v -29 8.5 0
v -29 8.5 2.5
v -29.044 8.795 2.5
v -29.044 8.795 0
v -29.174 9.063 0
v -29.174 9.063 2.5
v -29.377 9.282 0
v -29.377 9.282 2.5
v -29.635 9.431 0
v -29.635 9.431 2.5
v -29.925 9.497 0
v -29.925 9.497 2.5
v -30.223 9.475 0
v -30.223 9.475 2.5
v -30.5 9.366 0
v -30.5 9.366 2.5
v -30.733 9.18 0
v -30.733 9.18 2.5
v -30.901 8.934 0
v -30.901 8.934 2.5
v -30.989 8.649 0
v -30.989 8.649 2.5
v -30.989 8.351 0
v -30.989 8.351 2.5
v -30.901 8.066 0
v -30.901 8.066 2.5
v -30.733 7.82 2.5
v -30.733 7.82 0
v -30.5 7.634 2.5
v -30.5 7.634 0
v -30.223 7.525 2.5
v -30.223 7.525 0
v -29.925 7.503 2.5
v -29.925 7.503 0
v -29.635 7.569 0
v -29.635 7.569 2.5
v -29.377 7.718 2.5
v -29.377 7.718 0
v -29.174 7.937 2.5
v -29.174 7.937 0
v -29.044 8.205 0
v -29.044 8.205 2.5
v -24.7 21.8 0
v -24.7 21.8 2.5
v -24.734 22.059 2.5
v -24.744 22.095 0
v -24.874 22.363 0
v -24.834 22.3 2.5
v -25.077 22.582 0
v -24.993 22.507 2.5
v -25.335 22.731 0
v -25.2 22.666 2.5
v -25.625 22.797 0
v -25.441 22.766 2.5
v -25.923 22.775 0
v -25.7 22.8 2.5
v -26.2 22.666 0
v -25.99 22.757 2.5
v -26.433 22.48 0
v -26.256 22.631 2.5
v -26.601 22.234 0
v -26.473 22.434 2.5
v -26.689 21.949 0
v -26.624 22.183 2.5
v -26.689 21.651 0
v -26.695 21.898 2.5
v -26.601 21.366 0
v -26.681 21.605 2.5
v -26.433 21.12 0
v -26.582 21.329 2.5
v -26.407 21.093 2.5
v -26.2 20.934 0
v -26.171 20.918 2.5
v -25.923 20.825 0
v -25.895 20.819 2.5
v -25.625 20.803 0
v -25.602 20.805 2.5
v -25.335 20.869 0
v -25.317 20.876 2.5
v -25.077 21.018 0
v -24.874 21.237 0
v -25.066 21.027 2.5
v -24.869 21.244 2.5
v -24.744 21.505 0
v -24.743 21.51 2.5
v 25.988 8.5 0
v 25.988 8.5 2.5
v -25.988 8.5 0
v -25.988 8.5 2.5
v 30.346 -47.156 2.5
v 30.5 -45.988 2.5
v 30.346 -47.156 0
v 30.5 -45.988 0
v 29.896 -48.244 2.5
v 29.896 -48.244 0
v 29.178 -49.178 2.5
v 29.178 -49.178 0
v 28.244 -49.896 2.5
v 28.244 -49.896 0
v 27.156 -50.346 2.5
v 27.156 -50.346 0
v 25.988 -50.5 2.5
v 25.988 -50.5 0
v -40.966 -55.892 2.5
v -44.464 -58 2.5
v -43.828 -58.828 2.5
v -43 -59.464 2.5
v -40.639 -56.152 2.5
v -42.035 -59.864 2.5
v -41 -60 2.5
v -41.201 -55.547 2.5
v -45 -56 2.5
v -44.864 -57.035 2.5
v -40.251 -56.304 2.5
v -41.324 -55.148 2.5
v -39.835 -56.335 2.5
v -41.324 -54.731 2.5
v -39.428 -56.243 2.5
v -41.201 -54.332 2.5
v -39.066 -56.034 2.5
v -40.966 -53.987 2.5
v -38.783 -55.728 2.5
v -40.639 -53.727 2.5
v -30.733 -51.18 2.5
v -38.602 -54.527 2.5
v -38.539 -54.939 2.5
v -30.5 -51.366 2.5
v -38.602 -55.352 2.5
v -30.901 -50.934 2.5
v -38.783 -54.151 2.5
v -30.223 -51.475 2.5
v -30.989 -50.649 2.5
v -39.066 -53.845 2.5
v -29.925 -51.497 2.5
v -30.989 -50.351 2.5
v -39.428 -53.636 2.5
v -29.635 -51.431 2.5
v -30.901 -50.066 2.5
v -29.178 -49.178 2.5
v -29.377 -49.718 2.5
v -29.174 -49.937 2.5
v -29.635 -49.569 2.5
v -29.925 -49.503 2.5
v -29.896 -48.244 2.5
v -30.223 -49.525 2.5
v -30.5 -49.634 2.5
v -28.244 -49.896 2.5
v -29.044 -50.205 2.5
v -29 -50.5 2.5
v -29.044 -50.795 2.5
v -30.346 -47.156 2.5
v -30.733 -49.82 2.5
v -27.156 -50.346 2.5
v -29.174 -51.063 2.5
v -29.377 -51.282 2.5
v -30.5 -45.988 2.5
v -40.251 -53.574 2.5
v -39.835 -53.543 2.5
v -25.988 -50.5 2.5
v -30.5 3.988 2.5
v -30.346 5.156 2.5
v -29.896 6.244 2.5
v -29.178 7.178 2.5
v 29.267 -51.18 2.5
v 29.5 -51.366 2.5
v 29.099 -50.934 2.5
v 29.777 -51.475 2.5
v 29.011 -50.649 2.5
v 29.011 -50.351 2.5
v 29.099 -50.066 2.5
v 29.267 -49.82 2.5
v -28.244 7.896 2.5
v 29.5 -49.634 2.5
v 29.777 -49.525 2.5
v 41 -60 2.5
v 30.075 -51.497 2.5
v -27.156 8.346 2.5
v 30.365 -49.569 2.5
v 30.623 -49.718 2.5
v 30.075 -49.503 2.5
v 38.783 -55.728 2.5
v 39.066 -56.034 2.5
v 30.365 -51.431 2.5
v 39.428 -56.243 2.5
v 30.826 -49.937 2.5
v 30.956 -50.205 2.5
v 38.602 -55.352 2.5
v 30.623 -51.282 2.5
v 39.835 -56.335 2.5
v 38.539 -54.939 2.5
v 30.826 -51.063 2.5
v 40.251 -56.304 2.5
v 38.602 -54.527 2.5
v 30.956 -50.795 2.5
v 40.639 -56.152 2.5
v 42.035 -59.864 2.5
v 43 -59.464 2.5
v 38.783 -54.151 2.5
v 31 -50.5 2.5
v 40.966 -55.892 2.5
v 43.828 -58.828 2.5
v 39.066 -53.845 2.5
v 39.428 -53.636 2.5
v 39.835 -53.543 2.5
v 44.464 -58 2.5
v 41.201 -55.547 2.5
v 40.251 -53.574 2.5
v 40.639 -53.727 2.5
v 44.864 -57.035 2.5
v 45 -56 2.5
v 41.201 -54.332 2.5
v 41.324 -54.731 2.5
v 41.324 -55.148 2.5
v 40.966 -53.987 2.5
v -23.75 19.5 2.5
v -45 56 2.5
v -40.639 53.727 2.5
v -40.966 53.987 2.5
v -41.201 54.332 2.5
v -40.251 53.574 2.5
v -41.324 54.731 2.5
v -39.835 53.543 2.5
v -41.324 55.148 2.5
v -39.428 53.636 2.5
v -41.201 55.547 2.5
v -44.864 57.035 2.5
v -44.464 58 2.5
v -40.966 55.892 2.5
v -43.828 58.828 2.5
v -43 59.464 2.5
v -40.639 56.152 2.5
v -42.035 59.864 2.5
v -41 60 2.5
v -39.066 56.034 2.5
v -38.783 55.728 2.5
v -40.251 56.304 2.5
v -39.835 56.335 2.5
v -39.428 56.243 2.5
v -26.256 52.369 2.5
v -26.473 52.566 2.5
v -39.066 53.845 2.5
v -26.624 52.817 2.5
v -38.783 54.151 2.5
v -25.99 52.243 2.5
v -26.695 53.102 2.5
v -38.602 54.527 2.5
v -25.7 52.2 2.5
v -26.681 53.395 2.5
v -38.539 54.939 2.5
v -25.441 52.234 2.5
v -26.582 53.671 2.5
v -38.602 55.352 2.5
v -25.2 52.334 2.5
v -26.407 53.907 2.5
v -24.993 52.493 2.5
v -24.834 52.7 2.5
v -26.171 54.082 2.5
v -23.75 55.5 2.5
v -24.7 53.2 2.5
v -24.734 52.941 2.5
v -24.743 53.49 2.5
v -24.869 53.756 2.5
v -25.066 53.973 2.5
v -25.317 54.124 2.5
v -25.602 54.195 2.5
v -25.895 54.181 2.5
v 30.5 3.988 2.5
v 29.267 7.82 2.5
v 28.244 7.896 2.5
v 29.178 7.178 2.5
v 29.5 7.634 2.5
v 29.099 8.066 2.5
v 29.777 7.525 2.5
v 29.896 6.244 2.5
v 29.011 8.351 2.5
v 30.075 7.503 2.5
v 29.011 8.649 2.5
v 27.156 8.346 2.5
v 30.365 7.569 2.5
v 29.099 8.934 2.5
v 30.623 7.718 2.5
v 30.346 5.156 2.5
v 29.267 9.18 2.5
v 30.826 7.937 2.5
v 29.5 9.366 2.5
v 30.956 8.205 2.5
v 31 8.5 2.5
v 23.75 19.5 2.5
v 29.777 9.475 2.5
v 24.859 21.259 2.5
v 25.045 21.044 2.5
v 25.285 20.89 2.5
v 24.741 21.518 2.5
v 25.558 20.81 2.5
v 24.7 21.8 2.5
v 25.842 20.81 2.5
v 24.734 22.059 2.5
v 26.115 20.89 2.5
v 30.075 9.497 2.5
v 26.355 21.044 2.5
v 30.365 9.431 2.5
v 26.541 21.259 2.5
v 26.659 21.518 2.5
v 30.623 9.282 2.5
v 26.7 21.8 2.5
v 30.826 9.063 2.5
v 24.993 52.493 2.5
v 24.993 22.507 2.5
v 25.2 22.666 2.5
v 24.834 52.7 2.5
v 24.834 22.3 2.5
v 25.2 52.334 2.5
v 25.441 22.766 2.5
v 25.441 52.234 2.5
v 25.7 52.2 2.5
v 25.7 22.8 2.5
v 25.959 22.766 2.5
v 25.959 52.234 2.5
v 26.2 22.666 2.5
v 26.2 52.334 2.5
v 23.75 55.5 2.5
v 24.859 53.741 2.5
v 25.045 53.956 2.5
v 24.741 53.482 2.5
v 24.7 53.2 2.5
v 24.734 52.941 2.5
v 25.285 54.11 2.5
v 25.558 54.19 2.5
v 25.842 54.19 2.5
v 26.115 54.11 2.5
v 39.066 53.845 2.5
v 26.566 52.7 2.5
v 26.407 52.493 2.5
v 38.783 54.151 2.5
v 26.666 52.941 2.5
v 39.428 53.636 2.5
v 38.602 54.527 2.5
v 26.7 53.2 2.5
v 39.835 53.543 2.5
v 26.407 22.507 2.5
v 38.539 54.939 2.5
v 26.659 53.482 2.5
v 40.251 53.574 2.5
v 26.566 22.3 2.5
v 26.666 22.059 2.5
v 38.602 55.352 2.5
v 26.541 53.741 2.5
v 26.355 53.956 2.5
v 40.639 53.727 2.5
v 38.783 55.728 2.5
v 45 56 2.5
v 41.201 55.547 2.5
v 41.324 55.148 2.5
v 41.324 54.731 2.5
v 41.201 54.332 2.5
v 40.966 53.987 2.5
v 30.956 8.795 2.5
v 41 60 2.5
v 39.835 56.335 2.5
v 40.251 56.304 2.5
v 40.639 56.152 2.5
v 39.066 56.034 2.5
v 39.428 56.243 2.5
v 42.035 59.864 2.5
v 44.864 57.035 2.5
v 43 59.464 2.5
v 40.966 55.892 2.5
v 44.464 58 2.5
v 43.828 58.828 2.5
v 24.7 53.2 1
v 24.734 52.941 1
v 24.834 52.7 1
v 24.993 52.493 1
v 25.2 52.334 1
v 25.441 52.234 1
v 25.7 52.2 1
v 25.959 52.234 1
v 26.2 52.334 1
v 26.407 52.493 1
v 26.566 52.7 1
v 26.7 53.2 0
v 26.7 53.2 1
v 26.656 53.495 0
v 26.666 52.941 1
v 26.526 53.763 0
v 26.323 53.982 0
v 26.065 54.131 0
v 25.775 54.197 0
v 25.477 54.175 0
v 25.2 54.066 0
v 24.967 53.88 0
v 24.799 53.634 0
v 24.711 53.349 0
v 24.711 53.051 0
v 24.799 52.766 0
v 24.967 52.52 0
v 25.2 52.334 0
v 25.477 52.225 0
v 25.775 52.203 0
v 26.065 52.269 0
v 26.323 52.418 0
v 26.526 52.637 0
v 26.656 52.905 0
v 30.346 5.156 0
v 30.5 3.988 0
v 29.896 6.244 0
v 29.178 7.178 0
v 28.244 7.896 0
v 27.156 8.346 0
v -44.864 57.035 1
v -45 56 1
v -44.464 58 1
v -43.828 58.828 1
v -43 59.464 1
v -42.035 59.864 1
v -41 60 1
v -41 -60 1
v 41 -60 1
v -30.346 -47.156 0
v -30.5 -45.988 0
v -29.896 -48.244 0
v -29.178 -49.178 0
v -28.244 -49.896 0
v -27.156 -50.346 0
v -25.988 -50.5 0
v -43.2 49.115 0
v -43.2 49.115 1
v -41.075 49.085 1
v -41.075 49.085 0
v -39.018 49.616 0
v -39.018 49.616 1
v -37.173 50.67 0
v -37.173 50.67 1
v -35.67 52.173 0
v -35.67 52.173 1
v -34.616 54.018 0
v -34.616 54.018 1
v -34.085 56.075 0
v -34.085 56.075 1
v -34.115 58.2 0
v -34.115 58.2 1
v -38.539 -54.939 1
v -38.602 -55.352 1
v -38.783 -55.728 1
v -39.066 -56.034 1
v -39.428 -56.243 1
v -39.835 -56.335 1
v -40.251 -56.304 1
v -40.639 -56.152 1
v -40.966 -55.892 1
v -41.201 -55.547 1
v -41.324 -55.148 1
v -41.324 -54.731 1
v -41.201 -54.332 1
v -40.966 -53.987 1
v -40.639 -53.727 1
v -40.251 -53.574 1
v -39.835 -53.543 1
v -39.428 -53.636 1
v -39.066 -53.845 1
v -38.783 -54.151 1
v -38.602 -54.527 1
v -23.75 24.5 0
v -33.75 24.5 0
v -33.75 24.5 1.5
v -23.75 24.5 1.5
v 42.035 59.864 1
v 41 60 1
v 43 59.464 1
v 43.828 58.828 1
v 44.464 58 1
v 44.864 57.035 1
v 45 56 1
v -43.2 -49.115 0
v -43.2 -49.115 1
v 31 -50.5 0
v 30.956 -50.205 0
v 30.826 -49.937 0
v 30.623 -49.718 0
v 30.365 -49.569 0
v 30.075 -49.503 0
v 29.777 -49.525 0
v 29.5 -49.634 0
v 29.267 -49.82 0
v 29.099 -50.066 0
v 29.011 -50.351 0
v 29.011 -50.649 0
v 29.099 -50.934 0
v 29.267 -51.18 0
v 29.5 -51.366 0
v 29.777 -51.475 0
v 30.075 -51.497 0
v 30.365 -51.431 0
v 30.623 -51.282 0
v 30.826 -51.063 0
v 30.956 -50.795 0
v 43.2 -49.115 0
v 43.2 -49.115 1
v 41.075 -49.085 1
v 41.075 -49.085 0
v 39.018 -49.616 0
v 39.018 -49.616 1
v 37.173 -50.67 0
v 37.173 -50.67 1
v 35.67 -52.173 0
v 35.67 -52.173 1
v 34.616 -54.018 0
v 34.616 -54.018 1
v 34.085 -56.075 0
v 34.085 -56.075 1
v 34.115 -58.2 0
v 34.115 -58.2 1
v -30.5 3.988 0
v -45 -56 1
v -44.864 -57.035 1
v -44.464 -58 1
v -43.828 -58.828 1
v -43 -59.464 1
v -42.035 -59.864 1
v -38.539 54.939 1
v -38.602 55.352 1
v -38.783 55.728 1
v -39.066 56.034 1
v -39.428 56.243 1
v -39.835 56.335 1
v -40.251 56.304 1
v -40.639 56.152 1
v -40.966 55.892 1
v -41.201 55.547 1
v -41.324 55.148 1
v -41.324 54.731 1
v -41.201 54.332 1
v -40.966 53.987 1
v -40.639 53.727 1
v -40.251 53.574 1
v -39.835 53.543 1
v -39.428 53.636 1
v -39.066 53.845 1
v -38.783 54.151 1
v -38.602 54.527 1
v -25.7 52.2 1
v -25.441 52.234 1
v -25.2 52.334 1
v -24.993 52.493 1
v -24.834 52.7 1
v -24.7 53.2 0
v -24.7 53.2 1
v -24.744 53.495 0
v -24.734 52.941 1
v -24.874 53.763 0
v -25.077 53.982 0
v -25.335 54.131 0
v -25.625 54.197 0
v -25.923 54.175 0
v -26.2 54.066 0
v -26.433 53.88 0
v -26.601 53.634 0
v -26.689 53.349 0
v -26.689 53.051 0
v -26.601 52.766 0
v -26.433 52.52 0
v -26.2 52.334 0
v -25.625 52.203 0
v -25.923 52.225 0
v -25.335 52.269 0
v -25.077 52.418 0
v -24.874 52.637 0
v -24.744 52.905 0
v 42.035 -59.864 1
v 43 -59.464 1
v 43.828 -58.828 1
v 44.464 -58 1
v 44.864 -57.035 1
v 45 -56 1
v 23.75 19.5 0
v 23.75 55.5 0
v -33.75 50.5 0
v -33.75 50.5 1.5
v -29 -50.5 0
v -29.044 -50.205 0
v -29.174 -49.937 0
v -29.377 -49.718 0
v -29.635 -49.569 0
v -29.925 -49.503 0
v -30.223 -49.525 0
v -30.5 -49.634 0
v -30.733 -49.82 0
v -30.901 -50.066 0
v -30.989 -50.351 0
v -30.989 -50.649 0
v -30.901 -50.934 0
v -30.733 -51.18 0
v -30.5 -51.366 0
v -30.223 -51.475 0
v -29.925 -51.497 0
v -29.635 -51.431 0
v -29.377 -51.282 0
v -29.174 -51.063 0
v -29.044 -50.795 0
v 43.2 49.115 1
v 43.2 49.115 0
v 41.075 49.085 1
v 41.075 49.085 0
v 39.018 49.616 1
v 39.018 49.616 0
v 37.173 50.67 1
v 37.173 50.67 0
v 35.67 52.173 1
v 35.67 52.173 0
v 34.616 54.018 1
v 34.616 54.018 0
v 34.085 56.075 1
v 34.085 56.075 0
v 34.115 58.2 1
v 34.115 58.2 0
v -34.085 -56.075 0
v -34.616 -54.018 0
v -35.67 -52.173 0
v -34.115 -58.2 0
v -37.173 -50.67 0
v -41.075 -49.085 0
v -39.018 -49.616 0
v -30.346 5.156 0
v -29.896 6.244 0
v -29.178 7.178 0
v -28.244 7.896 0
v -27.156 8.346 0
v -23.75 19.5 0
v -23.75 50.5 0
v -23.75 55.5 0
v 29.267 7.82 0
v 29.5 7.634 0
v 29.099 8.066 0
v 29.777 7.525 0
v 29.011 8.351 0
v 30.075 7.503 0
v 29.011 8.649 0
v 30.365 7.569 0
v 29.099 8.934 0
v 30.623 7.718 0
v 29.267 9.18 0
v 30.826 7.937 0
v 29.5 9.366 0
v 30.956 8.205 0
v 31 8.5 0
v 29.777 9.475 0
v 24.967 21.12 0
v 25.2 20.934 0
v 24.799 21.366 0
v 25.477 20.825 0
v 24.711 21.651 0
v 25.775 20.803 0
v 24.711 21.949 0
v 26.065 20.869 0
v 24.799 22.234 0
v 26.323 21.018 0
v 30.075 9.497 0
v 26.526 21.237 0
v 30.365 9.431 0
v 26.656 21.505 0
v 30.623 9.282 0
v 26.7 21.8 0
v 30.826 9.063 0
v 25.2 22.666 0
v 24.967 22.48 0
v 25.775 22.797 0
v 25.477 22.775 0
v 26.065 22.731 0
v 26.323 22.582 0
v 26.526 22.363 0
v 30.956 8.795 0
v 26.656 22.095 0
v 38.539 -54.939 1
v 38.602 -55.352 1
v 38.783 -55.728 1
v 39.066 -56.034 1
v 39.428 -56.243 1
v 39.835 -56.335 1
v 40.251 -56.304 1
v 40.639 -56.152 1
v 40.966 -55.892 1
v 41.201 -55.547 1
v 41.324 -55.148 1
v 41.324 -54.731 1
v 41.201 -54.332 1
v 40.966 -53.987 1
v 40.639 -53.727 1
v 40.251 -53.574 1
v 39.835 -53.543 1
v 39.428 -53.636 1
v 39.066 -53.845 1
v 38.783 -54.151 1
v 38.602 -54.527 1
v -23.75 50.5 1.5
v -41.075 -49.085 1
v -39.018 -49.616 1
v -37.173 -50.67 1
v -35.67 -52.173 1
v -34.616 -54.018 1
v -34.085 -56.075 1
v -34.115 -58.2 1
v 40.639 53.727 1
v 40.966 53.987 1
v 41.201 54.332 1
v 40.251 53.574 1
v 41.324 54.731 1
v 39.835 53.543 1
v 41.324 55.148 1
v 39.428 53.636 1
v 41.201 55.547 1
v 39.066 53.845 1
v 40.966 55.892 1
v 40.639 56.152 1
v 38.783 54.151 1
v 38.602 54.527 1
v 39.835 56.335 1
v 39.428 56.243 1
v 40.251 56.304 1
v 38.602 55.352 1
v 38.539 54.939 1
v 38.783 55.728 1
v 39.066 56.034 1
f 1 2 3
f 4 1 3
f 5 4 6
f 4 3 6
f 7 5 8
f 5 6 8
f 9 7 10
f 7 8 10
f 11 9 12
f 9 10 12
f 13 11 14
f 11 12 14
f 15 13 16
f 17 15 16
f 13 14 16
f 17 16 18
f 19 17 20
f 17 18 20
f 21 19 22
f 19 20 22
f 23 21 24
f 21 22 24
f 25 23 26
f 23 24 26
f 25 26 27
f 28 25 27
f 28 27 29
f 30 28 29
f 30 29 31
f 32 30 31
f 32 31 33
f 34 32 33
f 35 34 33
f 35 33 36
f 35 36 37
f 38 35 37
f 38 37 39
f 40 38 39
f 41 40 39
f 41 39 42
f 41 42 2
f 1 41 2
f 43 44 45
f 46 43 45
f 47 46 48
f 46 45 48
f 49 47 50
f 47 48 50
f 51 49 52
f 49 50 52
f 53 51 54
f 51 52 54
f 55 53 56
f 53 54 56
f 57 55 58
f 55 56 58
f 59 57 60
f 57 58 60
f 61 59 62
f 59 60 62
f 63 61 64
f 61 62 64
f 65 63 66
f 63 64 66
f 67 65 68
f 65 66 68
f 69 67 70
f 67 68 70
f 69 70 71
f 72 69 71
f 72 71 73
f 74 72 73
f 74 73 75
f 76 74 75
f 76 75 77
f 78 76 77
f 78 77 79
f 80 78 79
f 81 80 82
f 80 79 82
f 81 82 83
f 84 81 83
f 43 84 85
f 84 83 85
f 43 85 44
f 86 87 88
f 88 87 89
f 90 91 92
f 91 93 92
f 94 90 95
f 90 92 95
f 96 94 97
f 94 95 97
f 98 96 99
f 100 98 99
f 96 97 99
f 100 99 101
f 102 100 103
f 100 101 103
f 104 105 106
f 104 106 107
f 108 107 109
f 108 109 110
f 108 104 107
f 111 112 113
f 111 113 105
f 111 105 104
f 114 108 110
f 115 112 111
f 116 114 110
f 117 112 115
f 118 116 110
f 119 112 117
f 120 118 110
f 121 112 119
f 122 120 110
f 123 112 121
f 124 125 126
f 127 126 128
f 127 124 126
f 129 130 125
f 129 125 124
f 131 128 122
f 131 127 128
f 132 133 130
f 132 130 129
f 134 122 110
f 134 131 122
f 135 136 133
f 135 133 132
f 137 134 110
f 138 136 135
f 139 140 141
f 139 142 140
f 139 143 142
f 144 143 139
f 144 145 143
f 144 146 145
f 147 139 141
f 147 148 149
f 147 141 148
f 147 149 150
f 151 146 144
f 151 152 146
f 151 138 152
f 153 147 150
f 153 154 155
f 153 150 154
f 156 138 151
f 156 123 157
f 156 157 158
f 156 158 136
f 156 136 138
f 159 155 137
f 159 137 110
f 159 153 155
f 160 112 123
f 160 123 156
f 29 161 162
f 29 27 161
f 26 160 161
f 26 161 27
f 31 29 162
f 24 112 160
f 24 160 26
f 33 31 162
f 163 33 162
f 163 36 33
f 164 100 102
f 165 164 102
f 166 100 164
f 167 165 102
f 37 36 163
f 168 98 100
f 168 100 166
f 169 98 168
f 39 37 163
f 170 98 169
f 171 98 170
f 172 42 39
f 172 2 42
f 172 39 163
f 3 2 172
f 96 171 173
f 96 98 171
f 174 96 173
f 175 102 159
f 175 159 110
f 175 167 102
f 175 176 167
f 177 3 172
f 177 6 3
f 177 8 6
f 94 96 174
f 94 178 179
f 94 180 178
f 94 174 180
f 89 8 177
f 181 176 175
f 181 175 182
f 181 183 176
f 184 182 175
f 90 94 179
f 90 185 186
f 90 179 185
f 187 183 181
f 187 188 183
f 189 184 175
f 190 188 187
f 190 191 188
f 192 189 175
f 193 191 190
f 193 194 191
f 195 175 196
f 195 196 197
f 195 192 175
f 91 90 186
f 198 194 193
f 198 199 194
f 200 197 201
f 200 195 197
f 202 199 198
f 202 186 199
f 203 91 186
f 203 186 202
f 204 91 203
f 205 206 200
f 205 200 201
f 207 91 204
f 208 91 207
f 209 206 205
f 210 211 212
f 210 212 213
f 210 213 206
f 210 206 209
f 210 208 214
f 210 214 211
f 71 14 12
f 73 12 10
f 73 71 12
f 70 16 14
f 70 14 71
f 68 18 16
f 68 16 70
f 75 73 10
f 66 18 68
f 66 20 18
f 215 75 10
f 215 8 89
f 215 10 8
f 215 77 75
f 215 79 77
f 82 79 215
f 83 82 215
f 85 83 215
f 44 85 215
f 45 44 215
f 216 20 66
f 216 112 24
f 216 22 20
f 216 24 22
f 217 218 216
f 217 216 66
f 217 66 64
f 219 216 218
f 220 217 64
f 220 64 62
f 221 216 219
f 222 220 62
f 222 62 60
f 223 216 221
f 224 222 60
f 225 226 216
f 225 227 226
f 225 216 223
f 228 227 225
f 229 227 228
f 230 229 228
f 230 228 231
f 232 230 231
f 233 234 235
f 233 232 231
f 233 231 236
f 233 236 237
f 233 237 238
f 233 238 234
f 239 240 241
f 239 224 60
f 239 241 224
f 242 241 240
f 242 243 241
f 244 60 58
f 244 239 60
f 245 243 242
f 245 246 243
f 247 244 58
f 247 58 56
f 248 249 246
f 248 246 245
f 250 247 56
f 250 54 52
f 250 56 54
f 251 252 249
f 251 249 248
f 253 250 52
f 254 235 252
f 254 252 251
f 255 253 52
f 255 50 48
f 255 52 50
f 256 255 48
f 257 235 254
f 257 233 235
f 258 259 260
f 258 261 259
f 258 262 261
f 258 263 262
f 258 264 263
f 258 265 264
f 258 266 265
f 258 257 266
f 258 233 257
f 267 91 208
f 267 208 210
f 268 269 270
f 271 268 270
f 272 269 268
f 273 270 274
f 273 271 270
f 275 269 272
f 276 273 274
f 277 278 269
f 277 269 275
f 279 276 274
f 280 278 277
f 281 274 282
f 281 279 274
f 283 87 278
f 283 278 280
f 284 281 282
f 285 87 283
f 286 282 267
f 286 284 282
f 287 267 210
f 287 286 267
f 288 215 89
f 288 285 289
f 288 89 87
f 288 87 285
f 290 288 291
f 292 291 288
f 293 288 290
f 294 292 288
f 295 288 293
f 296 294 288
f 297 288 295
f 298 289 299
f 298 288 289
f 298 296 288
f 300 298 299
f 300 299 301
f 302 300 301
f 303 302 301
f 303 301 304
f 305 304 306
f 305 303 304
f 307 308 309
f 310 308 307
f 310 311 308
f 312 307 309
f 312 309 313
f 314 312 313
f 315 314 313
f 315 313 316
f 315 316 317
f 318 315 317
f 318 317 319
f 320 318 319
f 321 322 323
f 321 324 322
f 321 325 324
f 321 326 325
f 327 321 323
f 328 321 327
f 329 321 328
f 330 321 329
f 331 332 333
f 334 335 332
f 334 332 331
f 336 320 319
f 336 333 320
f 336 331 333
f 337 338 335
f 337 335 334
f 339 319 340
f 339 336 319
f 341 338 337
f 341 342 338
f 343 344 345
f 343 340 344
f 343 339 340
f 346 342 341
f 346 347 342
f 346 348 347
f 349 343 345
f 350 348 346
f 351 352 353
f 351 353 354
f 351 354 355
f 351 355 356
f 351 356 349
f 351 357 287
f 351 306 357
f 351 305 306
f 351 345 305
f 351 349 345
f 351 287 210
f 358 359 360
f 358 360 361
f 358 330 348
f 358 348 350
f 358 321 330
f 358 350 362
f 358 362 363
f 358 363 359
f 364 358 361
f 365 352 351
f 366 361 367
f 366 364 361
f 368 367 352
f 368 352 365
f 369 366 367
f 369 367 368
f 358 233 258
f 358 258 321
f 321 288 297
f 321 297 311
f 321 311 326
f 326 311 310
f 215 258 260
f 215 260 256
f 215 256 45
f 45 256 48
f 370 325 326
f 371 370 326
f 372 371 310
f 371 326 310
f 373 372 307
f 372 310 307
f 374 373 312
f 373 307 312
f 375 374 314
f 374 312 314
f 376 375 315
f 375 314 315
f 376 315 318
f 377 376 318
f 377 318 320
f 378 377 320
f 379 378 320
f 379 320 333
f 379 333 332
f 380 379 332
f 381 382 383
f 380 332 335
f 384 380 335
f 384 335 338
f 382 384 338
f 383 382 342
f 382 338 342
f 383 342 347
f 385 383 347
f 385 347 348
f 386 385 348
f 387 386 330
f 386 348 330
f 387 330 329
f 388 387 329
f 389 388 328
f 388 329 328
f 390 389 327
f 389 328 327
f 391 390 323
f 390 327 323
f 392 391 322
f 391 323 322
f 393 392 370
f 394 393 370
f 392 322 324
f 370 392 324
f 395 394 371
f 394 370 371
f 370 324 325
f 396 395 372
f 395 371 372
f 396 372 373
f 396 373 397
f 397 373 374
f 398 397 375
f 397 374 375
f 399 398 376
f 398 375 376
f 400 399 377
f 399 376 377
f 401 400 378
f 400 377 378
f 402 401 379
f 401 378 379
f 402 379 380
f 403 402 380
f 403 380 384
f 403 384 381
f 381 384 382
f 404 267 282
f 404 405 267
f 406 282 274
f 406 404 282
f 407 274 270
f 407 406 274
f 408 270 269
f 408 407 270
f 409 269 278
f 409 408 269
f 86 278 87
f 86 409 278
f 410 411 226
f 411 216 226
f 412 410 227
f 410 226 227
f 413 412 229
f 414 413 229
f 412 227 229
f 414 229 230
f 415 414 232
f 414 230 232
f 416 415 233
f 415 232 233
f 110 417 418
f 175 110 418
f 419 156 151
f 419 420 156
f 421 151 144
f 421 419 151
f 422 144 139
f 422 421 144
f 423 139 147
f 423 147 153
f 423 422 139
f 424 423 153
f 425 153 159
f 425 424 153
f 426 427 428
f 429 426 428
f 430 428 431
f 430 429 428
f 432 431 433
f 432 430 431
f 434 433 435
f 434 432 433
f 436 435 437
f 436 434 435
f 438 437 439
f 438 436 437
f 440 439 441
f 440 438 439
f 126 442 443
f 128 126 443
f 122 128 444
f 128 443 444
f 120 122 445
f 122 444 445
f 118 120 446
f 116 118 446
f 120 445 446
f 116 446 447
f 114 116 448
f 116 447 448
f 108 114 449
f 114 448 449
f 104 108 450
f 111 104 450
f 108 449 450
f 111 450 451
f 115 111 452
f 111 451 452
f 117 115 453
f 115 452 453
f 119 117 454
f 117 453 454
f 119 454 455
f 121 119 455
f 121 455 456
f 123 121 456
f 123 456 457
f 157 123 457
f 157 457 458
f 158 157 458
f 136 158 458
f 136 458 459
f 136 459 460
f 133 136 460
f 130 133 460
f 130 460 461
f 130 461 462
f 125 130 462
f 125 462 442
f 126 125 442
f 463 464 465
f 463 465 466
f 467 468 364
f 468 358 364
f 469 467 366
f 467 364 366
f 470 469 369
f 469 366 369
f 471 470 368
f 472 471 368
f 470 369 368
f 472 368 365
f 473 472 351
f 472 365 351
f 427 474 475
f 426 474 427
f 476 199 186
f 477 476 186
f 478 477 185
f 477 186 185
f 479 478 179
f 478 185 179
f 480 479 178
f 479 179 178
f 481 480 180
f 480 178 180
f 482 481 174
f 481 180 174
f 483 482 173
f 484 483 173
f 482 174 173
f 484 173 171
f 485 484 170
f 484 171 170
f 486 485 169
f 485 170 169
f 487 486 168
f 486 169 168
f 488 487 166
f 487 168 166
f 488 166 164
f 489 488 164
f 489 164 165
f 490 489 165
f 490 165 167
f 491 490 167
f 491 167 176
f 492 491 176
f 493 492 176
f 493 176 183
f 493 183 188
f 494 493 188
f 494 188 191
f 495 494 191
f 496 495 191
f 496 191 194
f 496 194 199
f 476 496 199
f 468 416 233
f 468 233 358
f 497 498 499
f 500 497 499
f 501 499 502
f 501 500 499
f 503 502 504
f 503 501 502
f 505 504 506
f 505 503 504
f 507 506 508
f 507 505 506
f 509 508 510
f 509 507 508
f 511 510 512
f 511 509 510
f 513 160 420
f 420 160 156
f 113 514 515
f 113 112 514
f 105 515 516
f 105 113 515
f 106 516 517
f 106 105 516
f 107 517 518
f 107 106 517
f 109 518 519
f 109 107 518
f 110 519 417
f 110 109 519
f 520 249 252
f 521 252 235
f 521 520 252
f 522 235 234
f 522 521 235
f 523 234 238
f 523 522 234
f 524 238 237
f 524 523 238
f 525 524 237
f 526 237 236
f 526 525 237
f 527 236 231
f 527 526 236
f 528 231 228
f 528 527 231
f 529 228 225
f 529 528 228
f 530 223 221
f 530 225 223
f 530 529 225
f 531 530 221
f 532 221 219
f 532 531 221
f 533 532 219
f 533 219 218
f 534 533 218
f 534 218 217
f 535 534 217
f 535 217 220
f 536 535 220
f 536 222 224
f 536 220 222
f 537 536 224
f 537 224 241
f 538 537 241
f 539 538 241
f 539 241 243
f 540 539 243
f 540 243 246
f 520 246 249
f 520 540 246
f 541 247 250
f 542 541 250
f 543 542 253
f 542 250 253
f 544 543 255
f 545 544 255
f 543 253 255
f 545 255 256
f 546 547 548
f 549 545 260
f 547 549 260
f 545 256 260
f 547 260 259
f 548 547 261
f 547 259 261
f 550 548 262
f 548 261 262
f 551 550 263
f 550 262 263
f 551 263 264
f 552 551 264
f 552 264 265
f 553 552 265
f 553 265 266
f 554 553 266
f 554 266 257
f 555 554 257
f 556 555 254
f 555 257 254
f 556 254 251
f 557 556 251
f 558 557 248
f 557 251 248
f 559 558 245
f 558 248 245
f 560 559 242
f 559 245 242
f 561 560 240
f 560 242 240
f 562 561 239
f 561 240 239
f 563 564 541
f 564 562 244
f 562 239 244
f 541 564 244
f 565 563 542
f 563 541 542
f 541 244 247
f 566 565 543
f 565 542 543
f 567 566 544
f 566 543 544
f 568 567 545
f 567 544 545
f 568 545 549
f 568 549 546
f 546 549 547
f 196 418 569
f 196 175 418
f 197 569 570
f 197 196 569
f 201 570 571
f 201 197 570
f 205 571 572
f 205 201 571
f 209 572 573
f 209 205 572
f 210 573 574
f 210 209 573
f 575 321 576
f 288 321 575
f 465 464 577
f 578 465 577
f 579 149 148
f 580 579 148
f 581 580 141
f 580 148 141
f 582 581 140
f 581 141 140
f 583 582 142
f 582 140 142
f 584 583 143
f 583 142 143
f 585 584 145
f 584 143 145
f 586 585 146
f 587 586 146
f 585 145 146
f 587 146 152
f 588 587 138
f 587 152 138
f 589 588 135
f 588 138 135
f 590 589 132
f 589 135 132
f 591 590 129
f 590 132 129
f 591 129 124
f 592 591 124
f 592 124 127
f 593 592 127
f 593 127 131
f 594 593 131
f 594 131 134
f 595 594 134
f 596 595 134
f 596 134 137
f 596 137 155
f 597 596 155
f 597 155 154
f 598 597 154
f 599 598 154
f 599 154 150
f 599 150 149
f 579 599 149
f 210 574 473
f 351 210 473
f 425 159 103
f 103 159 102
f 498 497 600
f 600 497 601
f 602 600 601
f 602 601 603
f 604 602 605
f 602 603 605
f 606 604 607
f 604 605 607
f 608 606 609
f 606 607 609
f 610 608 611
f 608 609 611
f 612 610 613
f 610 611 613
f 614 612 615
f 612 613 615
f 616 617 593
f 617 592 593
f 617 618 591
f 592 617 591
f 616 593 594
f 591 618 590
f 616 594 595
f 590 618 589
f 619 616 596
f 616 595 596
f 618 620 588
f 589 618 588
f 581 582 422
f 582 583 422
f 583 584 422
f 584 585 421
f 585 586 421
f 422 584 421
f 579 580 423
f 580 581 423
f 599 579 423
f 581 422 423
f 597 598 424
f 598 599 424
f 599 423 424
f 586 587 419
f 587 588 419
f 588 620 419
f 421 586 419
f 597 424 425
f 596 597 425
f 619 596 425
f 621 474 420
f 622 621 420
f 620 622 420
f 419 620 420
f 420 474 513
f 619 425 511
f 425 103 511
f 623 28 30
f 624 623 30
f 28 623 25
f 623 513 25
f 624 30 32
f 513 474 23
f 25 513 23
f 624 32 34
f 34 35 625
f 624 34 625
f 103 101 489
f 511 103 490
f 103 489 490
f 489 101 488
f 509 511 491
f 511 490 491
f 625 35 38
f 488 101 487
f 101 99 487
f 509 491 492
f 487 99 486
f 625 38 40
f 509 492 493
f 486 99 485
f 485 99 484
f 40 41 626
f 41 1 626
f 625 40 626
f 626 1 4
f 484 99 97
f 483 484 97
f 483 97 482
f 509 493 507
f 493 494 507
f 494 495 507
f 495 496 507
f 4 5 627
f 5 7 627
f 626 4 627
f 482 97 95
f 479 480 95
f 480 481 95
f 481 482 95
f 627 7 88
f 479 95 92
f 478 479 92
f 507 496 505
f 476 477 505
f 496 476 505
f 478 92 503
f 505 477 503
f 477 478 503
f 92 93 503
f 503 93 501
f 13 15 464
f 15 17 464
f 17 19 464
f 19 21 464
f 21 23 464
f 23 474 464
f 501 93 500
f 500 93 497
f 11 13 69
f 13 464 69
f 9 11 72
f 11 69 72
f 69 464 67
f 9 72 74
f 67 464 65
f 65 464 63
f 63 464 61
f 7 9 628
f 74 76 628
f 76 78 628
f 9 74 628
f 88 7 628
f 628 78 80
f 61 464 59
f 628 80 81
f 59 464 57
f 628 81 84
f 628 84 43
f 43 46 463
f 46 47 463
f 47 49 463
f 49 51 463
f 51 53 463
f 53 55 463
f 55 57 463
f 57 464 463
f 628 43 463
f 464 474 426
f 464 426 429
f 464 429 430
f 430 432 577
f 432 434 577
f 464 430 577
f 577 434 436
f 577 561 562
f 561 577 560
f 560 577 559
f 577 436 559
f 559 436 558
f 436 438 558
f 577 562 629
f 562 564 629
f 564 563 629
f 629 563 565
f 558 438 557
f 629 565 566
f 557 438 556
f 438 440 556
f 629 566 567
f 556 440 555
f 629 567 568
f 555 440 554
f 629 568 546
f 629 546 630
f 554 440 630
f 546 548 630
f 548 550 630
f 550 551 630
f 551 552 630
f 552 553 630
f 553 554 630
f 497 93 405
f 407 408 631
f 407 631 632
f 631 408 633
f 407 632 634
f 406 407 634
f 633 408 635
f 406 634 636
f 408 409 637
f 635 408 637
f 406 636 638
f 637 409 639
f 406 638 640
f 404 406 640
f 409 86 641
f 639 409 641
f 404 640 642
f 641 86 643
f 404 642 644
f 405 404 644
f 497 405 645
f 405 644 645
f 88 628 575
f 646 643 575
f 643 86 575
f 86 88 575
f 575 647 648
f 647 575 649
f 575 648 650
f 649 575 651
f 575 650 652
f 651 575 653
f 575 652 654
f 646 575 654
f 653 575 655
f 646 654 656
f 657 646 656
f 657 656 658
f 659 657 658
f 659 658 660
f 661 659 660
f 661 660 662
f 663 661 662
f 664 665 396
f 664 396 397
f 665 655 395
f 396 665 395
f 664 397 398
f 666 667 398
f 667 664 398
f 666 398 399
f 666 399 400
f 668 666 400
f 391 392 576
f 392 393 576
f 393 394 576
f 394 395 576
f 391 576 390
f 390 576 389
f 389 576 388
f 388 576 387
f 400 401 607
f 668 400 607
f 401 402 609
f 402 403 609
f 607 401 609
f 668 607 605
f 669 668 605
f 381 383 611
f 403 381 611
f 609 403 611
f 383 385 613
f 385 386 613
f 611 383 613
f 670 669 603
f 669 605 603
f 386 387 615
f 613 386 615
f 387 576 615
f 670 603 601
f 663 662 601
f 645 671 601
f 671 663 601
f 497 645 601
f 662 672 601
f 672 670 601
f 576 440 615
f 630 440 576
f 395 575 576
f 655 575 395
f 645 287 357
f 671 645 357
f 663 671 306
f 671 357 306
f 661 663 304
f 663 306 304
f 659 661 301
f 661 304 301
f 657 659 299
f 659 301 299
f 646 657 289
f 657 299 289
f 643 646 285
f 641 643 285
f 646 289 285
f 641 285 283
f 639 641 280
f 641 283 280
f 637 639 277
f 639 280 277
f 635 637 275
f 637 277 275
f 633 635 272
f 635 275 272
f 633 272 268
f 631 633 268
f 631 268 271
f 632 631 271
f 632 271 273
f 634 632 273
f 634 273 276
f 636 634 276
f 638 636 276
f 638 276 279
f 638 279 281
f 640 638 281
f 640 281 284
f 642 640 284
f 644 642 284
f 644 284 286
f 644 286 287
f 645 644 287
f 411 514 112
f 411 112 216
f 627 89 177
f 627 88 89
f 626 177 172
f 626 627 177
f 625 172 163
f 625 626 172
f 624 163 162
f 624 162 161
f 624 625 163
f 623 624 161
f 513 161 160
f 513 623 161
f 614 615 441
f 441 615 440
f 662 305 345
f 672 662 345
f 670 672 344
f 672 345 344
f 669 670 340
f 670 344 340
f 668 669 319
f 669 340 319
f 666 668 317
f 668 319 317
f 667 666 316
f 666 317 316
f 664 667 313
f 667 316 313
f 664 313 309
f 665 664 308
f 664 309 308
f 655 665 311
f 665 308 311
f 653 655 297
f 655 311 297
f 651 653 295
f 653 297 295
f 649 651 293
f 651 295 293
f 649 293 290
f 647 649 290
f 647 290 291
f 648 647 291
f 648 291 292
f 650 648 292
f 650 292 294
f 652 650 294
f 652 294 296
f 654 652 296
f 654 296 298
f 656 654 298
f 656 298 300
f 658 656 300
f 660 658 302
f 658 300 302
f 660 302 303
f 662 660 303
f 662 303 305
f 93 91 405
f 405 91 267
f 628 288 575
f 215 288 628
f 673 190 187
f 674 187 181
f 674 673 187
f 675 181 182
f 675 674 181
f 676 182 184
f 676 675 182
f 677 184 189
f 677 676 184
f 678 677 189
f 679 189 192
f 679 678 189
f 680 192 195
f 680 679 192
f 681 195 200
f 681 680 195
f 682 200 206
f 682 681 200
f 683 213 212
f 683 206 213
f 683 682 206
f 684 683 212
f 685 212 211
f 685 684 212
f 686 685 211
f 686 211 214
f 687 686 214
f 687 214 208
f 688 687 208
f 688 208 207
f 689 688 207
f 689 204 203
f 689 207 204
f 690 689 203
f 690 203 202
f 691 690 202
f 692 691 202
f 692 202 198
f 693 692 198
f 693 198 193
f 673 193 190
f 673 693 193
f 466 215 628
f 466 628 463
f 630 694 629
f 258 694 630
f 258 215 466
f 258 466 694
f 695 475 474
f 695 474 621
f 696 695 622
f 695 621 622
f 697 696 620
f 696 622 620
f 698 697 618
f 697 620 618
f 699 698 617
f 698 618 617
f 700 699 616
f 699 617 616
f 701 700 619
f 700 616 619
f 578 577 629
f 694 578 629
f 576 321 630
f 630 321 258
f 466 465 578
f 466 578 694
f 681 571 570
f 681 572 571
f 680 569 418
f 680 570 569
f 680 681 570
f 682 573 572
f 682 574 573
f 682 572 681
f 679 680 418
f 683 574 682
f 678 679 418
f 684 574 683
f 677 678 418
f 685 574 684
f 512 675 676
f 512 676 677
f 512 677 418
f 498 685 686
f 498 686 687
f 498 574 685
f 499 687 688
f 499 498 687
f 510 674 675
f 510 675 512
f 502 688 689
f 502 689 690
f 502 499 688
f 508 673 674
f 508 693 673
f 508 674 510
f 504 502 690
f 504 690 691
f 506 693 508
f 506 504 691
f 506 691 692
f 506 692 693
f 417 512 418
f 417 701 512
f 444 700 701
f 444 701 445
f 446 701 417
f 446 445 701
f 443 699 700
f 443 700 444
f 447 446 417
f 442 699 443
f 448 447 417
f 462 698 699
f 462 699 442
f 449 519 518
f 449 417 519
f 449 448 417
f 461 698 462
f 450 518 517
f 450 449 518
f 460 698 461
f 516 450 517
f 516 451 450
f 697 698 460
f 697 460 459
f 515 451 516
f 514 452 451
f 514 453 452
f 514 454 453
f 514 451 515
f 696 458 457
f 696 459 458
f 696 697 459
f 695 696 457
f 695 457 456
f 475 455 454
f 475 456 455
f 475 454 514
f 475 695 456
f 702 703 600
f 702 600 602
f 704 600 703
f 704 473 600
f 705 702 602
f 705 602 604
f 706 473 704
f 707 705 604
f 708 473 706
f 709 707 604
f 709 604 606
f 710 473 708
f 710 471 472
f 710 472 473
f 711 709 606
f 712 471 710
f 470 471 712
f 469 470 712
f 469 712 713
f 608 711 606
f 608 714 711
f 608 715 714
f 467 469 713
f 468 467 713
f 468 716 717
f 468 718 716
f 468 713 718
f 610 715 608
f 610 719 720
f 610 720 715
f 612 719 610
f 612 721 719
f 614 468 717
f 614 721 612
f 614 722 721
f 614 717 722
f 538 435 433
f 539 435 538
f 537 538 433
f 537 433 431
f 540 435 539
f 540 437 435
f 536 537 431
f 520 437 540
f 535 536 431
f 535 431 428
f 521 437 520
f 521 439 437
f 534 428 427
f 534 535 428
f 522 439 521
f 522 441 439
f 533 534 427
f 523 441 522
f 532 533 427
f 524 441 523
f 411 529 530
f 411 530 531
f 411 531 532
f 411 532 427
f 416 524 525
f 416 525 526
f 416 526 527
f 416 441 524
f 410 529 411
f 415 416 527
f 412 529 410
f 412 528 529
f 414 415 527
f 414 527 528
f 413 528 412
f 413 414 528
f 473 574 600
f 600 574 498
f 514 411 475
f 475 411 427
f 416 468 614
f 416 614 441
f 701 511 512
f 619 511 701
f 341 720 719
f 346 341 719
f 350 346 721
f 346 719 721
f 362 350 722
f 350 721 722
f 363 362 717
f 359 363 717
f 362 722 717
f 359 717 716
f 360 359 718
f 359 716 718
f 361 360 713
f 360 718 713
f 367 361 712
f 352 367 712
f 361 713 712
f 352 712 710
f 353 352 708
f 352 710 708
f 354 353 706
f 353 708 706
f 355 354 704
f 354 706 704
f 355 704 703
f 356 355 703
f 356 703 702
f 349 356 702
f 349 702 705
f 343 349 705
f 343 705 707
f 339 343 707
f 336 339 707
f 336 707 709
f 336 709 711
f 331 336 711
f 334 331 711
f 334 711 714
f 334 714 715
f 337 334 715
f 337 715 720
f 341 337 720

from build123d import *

# Parameters (mm, degrees)
SKETCH1_W               = 90
SKETCH1_H               = 120
BOSS_EXTRUDE1_DEPTH     = 2.5
SKETCH2_W               = 61
SKETCH2_H               = 59
SKETCH2_W_2             = 47.5
SKETCH2_H_2             = 36
CUT_EXTRUDE2_DEPTH      = 10
SKETCH4_W               = 90
SKETCH4_H               = 120
SKETCH4_W_2             = 86.4
SKETCH4_H_2             = 116.4
CUT_EXTRUDE4_DEPTH      = 1
FILLET2_R               = 4
FILLET3_R               = 4.512
SKETCH2_4_R             = 1
CUT_EXTRUDE6_DEPTH      = 1.5
SKETCH5_R               = 1
CUT_EXTRUDE9_DEPTH      = 1.5
SKETCH6_R               = 1
CUT_EXTRUDE10_DEPTH     = 5
SKETCH7_R               = 1
CUT_EXTRUDE11_DEPTH     = 5
SKETCH8_R               = 1
CUT_EXTRUDE12_DEPTH     = 5
SKETCH9_R               = 1
CUT_EXTRUDE13_DEPTH     = 5
SKETCH10_R              = 1
CUT_EXTRUDE14_DEPTH     = 5
SKETCH11_R              = 1
CUT_EXTRUDE15_DEPTH     = 5
SKETCH12_R              = 1
CUT_EXTRUDE16_DEPTH     = 5
SKETCH13_R              = 1
CUT_EXTRUDE17_DEPTH     = 5
SKE_VAT_R               = 8
VAT_DEPTH               = 1
MIRROR3_COPY_1_SKETCH_R = 8
MIRROR3_COPY_1_DEPTH    = 1
MIRROR3_COPY_2_SKETCH_R = 8
MIRROR3_COPY_2_DEPTH    = 1
SKETCH18_W              = 10
SKETCH18_H              = 26
CUT_EXTRUDE19_DEPTH     = 1.5
CUT_EXTRUDE20_DEPTH     = 10
MIRROR5_COPY_1_DEPTH    = 10


with BuildPart() as part:
    # Sketch1 → Boss-Extrude1 (new body)
    with BuildSketch(Plane.XY):
        Rectangle(SKETCH1_W, SKETCH1_H)
    extrude(amount=BOSS_EXTRUDE1_DEPTH)

    # Sketch2 → Cut-Extrude2 (cut)
    with BuildSketch(Plane.XY.offset(2.5)):
        with Locations((0, -21)):
            Rectangle(SKETCH2_W, SKETCH2_H)
        with Locations((0, 37.5)):
            Rectangle(SKETCH2_W_2, SKETCH2_H_2)
    extrude(amount=-CUT_EXTRUDE2_DEPTH, mode=Mode.SUBTRACT)

    # Sketch4 → Cut-Extrude4 (cut)
    with BuildSketch(Plane(origin=(0, 0, 0), x_dir=(-1, 0, 0), z_dir=(0, 0, -1))):
        Rectangle(SKETCH4_W, SKETCH4_H)
        Rectangle(SKETCH4_W_2, SKETCH4_H_2, mode=Mode.SUBTRACT)
    extrude(amount=-CUT_EXTRUDE4_DEPTH, mode=Mode.SUBTRACT)

    # Fillet2
    fillet2_edges = [part.edges().sort_by_distance(p)[0] for p in [
        (-45, 60, 1.75),
        (45, 60, 1.75),
        (45, -60, 1.75),
        (-45, -60, 1.75),
        (-43.2, -58.2, 0.5),
        (43.2, -58.2, 0.5),
        (-43.2, 58.2, 0.5),
        (43.2, 58.2, 0.5),
    ]]
    fillet(fillet2_edges, radius=FILLET2_R)

    # Fillet3
    fillet3_edges = [part.edges().sort_by_distance(p)[0] for p in [
        (-30.5, -50.5, 1.25),
        (30.5, -50.5, 1.25),
        (30.5, 8.5, 1.25),
        (-30.5, 8.5, 1.25),
    ]]
    fillet(fillet3_edges, radius=FILLET3_R)

    # Sketch2<4> → Cut-Extrude6 (cut)
    with BuildSketch(Plane.XY.offset(2.5)):
        with Locations((25.7, 53.2)):
            Circle(SKETCH2_4_R)
        with Locations((-25.7, 53.2)):
            Circle(SKETCH2_4_R)
        with Locations((-25.7, 21.8)):
            Circle(SKETCH2_4_R)
        with Locations((25.7, 21.8)):
            Circle(SKETCH2_4_R)
    extrude(amount=-CUT_EXTRUDE6_DEPTH, mode=Mode.SUBTRACT)

    # Sketch5 → Cut-Extrude9 (cut)
    with BuildSketch(Plane.XY.offset(2.5)):
        with Locations((-30, -50.5)):
            Circle(SKETCH5_R)
        with Locations((-30, 8.5)):
            Circle(SKETCH5_R)
        with Locations((30, 8.5)):
            Circle(SKETCH5_R)
        with Locations((30, -50.5)):
            Circle(SKETCH5_R)
    extrude(amount=-CUT_EXTRUDE9_DEPTH, mode=Mode.SUBTRACT)

    # Sketch6 → Cut-Extrude10 (cut)
    with BuildSketch(Plane.XY.offset(2.5)):
        with Locations((-30, 8.5)):
            Circle(SKETCH6_R)
    extrude(amount=-CUT_EXTRUDE10_DEPTH, mode=Mode.SUBTRACT)

    # Sketch7 → Cut-Extrude11 (cut)
    with BuildSketch(Plane.XY.offset(2.5)):
        with Locations((30, 8.5)):
            Circle(SKETCH7_R)
    extrude(amount=-CUT_EXTRUDE11_DEPTH, mode=Mode.SUBTRACT)

    # Sketch8 → Cut-Extrude12 (cut)
    with BuildSketch(Plane.XY.offset(2.5)):
        with Locations((-25.7, 21.8)):
            Circle(SKETCH8_R)
    extrude(amount=-CUT_EXTRUDE12_DEPTH, mode=Mode.SUBTRACT)

    # Sketch9 → Cut-Extrude13 (cut)
    with BuildSketch(Plane.XY.offset(2.5)):
        with Locations((25.7, 21.8)):
            Circle(SKETCH9_R)
    extrude(amount=-CUT_EXTRUDE13_DEPTH, mode=Mode.SUBTRACT)

    # Sketch10 → Cut-Extrude14 (cut)
    with BuildSketch(Plane.XY.offset(2.5)):
        with Locations((-30, -50.5)):
            Circle(SKETCH10_R)
    extrude(amount=-CUT_EXTRUDE14_DEPTH, mode=Mode.SUBTRACT)

    # Sketch11 → Cut-Extrude15 (cut)
    with BuildSketch(Plane.XY.offset(2.5)):
        with Locations((30, -50.5)):
            Circle(SKETCH11_R)
    extrude(amount=-CUT_EXTRUDE15_DEPTH, mode=Mode.SUBTRACT)

    # Sketch12 → Cut-Extrude16 (cut)
    with BuildSketch(Plane.XY.offset(2.5)):
        with Locations((25.7, 53.2)):
            Circle(SKETCH12_R)
    extrude(amount=-CUT_EXTRUDE16_DEPTH, mode=Mode.SUBTRACT)

    # Sketch13 → Cut-Extrude17 (cut)
    with BuildSketch(Plane.XY.offset(2.5)):
        with Locations((-25.7, 53.2)):
            Circle(SKETCH13_R)
    extrude(amount=-CUT_EXTRUDE17_DEPTH, mode=Mode.SUBTRACT)

    # ske_vat → vat (cut)
    with BuildSketch(Plane(origin=(0, 0, 0), x_dir=(1, 0, 0), z_dir=(0, 0, -1))):
        with Locations((42.028427125, -57.028427125)):
            Circle(SKE_VAT_R)
    vat = extrude(amount=-VAT_DEPTH, mode=Mode.SUBTRACT)

    # Mirror1: vat across plane
    add(vat.mirror(Plane(origin=(0, 0, 0), x_dir=(0, 0, 1), z_dir=(1, 0, 0))), mode=Mode.SUBTRACT)

    # Mirror2: vat across plane
    add(vat.mirror(Plane.ZX), mode=Mode.SUBTRACT)

    # Mirror3 copy 1 sketch → Mirror3 copy 1 (cut)
    with BuildSketch(Plane(origin=(0, 0, 0), x_dir=(-1, 0, 0), z_dir=(0, 0, -1))):
        with Locations((42.028427125, -57.028427125)):
            Circle(MIRROR3_COPY_1_SKETCH_R)
    extrude(amount=-MIRROR3_COPY_1_DEPTH, mode=Mode.SUBTRACT)

    # Mirror3 copy 2 sketch → Mirror3 copy 2 (cut)
    with BuildSketch(Plane(origin=(0, 0, 0), x_dir=(-1, 0, 0), z_dir=(0, 0, -1))):
        with Locations((42.028427125, 57.028427125)):
            Circle(MIRROR3_COPY_2_SKETCH_R)
    extrude(amount=-MIRROR3_COPY_2_DEPTH, mode=Mode.SUBTRACT)

    # Sketch18 → Cut-Extrude19 (cut)
    with BuildSketch(Plane(origin=(0, 0, 0), x_dir=(1, 0, 0), z_dir=(0, 0, -1))):
        with Locations((-28.75, -37.5)):
            Rectangle(SKETCH18_W, SKETCH18_H)
    extrude(amount=-CUT_EXTRUDE19_DEPTH, mode=Mode.SUBTRACT)

    # Sketch19 → Cut-Extrude20 (cut)
    with BuildSketch(Plane(origin=(0, 0, 1), x_dir=(1, 0, 0), z_dir=(0, 0, -1))):
        with BuildLine():
            ThreePointArc((40.929289322, -55.929289322), (41.232771174, -55.475096634), (41.339339828, -54.939339828))
            ThreePointArc((41.339339828, -54.939339828), (38.645908483, -54.403583023), (40.929289322, -55.929289322))
        make_face()
    cut_extrude20 = extrude(amount=-CUT_EXTRUDE20_DEPTH, mode=Mode.SUBTRACT)

    # Mirror4: Cut-Extrude20 across plane
    add(cut_extrude20.mirror(Plane(origin=(0, 0, 0), x_dir=(0, 0, 1), z_dir=(1, 0, 0))), mode=Mode.SUBTRACT)

    # Mirror5: Cut-Extrude20 across plane
    add(cut_extrude20.mirror(Plane.ZX), mode=Mode.SUBTRACT)

    # Mirror5 copy 1 sketch → Mirror5 copy 1 (cut)
    with BuildSketch(Plane(origin=(0, 0, 1), x_dir=(-1, 0, 0), z_dir=(0, 0, -1))):
        with BuildLine():
            ThreePointArc((40.929289322, -55.929289322), (41.232771174, -55.475096634), (41.339339828, -54.939339828))
            ThreePointArc((41.339339828, -54.939339828), (38.645908483, -54.403583023), (40.929289322, -55.929289322))
        make_face()
    extrude(amount=-MIRROR5_COPY_1_DEPTH, mode=Mode.SUBTRACT)


solid = part.part
